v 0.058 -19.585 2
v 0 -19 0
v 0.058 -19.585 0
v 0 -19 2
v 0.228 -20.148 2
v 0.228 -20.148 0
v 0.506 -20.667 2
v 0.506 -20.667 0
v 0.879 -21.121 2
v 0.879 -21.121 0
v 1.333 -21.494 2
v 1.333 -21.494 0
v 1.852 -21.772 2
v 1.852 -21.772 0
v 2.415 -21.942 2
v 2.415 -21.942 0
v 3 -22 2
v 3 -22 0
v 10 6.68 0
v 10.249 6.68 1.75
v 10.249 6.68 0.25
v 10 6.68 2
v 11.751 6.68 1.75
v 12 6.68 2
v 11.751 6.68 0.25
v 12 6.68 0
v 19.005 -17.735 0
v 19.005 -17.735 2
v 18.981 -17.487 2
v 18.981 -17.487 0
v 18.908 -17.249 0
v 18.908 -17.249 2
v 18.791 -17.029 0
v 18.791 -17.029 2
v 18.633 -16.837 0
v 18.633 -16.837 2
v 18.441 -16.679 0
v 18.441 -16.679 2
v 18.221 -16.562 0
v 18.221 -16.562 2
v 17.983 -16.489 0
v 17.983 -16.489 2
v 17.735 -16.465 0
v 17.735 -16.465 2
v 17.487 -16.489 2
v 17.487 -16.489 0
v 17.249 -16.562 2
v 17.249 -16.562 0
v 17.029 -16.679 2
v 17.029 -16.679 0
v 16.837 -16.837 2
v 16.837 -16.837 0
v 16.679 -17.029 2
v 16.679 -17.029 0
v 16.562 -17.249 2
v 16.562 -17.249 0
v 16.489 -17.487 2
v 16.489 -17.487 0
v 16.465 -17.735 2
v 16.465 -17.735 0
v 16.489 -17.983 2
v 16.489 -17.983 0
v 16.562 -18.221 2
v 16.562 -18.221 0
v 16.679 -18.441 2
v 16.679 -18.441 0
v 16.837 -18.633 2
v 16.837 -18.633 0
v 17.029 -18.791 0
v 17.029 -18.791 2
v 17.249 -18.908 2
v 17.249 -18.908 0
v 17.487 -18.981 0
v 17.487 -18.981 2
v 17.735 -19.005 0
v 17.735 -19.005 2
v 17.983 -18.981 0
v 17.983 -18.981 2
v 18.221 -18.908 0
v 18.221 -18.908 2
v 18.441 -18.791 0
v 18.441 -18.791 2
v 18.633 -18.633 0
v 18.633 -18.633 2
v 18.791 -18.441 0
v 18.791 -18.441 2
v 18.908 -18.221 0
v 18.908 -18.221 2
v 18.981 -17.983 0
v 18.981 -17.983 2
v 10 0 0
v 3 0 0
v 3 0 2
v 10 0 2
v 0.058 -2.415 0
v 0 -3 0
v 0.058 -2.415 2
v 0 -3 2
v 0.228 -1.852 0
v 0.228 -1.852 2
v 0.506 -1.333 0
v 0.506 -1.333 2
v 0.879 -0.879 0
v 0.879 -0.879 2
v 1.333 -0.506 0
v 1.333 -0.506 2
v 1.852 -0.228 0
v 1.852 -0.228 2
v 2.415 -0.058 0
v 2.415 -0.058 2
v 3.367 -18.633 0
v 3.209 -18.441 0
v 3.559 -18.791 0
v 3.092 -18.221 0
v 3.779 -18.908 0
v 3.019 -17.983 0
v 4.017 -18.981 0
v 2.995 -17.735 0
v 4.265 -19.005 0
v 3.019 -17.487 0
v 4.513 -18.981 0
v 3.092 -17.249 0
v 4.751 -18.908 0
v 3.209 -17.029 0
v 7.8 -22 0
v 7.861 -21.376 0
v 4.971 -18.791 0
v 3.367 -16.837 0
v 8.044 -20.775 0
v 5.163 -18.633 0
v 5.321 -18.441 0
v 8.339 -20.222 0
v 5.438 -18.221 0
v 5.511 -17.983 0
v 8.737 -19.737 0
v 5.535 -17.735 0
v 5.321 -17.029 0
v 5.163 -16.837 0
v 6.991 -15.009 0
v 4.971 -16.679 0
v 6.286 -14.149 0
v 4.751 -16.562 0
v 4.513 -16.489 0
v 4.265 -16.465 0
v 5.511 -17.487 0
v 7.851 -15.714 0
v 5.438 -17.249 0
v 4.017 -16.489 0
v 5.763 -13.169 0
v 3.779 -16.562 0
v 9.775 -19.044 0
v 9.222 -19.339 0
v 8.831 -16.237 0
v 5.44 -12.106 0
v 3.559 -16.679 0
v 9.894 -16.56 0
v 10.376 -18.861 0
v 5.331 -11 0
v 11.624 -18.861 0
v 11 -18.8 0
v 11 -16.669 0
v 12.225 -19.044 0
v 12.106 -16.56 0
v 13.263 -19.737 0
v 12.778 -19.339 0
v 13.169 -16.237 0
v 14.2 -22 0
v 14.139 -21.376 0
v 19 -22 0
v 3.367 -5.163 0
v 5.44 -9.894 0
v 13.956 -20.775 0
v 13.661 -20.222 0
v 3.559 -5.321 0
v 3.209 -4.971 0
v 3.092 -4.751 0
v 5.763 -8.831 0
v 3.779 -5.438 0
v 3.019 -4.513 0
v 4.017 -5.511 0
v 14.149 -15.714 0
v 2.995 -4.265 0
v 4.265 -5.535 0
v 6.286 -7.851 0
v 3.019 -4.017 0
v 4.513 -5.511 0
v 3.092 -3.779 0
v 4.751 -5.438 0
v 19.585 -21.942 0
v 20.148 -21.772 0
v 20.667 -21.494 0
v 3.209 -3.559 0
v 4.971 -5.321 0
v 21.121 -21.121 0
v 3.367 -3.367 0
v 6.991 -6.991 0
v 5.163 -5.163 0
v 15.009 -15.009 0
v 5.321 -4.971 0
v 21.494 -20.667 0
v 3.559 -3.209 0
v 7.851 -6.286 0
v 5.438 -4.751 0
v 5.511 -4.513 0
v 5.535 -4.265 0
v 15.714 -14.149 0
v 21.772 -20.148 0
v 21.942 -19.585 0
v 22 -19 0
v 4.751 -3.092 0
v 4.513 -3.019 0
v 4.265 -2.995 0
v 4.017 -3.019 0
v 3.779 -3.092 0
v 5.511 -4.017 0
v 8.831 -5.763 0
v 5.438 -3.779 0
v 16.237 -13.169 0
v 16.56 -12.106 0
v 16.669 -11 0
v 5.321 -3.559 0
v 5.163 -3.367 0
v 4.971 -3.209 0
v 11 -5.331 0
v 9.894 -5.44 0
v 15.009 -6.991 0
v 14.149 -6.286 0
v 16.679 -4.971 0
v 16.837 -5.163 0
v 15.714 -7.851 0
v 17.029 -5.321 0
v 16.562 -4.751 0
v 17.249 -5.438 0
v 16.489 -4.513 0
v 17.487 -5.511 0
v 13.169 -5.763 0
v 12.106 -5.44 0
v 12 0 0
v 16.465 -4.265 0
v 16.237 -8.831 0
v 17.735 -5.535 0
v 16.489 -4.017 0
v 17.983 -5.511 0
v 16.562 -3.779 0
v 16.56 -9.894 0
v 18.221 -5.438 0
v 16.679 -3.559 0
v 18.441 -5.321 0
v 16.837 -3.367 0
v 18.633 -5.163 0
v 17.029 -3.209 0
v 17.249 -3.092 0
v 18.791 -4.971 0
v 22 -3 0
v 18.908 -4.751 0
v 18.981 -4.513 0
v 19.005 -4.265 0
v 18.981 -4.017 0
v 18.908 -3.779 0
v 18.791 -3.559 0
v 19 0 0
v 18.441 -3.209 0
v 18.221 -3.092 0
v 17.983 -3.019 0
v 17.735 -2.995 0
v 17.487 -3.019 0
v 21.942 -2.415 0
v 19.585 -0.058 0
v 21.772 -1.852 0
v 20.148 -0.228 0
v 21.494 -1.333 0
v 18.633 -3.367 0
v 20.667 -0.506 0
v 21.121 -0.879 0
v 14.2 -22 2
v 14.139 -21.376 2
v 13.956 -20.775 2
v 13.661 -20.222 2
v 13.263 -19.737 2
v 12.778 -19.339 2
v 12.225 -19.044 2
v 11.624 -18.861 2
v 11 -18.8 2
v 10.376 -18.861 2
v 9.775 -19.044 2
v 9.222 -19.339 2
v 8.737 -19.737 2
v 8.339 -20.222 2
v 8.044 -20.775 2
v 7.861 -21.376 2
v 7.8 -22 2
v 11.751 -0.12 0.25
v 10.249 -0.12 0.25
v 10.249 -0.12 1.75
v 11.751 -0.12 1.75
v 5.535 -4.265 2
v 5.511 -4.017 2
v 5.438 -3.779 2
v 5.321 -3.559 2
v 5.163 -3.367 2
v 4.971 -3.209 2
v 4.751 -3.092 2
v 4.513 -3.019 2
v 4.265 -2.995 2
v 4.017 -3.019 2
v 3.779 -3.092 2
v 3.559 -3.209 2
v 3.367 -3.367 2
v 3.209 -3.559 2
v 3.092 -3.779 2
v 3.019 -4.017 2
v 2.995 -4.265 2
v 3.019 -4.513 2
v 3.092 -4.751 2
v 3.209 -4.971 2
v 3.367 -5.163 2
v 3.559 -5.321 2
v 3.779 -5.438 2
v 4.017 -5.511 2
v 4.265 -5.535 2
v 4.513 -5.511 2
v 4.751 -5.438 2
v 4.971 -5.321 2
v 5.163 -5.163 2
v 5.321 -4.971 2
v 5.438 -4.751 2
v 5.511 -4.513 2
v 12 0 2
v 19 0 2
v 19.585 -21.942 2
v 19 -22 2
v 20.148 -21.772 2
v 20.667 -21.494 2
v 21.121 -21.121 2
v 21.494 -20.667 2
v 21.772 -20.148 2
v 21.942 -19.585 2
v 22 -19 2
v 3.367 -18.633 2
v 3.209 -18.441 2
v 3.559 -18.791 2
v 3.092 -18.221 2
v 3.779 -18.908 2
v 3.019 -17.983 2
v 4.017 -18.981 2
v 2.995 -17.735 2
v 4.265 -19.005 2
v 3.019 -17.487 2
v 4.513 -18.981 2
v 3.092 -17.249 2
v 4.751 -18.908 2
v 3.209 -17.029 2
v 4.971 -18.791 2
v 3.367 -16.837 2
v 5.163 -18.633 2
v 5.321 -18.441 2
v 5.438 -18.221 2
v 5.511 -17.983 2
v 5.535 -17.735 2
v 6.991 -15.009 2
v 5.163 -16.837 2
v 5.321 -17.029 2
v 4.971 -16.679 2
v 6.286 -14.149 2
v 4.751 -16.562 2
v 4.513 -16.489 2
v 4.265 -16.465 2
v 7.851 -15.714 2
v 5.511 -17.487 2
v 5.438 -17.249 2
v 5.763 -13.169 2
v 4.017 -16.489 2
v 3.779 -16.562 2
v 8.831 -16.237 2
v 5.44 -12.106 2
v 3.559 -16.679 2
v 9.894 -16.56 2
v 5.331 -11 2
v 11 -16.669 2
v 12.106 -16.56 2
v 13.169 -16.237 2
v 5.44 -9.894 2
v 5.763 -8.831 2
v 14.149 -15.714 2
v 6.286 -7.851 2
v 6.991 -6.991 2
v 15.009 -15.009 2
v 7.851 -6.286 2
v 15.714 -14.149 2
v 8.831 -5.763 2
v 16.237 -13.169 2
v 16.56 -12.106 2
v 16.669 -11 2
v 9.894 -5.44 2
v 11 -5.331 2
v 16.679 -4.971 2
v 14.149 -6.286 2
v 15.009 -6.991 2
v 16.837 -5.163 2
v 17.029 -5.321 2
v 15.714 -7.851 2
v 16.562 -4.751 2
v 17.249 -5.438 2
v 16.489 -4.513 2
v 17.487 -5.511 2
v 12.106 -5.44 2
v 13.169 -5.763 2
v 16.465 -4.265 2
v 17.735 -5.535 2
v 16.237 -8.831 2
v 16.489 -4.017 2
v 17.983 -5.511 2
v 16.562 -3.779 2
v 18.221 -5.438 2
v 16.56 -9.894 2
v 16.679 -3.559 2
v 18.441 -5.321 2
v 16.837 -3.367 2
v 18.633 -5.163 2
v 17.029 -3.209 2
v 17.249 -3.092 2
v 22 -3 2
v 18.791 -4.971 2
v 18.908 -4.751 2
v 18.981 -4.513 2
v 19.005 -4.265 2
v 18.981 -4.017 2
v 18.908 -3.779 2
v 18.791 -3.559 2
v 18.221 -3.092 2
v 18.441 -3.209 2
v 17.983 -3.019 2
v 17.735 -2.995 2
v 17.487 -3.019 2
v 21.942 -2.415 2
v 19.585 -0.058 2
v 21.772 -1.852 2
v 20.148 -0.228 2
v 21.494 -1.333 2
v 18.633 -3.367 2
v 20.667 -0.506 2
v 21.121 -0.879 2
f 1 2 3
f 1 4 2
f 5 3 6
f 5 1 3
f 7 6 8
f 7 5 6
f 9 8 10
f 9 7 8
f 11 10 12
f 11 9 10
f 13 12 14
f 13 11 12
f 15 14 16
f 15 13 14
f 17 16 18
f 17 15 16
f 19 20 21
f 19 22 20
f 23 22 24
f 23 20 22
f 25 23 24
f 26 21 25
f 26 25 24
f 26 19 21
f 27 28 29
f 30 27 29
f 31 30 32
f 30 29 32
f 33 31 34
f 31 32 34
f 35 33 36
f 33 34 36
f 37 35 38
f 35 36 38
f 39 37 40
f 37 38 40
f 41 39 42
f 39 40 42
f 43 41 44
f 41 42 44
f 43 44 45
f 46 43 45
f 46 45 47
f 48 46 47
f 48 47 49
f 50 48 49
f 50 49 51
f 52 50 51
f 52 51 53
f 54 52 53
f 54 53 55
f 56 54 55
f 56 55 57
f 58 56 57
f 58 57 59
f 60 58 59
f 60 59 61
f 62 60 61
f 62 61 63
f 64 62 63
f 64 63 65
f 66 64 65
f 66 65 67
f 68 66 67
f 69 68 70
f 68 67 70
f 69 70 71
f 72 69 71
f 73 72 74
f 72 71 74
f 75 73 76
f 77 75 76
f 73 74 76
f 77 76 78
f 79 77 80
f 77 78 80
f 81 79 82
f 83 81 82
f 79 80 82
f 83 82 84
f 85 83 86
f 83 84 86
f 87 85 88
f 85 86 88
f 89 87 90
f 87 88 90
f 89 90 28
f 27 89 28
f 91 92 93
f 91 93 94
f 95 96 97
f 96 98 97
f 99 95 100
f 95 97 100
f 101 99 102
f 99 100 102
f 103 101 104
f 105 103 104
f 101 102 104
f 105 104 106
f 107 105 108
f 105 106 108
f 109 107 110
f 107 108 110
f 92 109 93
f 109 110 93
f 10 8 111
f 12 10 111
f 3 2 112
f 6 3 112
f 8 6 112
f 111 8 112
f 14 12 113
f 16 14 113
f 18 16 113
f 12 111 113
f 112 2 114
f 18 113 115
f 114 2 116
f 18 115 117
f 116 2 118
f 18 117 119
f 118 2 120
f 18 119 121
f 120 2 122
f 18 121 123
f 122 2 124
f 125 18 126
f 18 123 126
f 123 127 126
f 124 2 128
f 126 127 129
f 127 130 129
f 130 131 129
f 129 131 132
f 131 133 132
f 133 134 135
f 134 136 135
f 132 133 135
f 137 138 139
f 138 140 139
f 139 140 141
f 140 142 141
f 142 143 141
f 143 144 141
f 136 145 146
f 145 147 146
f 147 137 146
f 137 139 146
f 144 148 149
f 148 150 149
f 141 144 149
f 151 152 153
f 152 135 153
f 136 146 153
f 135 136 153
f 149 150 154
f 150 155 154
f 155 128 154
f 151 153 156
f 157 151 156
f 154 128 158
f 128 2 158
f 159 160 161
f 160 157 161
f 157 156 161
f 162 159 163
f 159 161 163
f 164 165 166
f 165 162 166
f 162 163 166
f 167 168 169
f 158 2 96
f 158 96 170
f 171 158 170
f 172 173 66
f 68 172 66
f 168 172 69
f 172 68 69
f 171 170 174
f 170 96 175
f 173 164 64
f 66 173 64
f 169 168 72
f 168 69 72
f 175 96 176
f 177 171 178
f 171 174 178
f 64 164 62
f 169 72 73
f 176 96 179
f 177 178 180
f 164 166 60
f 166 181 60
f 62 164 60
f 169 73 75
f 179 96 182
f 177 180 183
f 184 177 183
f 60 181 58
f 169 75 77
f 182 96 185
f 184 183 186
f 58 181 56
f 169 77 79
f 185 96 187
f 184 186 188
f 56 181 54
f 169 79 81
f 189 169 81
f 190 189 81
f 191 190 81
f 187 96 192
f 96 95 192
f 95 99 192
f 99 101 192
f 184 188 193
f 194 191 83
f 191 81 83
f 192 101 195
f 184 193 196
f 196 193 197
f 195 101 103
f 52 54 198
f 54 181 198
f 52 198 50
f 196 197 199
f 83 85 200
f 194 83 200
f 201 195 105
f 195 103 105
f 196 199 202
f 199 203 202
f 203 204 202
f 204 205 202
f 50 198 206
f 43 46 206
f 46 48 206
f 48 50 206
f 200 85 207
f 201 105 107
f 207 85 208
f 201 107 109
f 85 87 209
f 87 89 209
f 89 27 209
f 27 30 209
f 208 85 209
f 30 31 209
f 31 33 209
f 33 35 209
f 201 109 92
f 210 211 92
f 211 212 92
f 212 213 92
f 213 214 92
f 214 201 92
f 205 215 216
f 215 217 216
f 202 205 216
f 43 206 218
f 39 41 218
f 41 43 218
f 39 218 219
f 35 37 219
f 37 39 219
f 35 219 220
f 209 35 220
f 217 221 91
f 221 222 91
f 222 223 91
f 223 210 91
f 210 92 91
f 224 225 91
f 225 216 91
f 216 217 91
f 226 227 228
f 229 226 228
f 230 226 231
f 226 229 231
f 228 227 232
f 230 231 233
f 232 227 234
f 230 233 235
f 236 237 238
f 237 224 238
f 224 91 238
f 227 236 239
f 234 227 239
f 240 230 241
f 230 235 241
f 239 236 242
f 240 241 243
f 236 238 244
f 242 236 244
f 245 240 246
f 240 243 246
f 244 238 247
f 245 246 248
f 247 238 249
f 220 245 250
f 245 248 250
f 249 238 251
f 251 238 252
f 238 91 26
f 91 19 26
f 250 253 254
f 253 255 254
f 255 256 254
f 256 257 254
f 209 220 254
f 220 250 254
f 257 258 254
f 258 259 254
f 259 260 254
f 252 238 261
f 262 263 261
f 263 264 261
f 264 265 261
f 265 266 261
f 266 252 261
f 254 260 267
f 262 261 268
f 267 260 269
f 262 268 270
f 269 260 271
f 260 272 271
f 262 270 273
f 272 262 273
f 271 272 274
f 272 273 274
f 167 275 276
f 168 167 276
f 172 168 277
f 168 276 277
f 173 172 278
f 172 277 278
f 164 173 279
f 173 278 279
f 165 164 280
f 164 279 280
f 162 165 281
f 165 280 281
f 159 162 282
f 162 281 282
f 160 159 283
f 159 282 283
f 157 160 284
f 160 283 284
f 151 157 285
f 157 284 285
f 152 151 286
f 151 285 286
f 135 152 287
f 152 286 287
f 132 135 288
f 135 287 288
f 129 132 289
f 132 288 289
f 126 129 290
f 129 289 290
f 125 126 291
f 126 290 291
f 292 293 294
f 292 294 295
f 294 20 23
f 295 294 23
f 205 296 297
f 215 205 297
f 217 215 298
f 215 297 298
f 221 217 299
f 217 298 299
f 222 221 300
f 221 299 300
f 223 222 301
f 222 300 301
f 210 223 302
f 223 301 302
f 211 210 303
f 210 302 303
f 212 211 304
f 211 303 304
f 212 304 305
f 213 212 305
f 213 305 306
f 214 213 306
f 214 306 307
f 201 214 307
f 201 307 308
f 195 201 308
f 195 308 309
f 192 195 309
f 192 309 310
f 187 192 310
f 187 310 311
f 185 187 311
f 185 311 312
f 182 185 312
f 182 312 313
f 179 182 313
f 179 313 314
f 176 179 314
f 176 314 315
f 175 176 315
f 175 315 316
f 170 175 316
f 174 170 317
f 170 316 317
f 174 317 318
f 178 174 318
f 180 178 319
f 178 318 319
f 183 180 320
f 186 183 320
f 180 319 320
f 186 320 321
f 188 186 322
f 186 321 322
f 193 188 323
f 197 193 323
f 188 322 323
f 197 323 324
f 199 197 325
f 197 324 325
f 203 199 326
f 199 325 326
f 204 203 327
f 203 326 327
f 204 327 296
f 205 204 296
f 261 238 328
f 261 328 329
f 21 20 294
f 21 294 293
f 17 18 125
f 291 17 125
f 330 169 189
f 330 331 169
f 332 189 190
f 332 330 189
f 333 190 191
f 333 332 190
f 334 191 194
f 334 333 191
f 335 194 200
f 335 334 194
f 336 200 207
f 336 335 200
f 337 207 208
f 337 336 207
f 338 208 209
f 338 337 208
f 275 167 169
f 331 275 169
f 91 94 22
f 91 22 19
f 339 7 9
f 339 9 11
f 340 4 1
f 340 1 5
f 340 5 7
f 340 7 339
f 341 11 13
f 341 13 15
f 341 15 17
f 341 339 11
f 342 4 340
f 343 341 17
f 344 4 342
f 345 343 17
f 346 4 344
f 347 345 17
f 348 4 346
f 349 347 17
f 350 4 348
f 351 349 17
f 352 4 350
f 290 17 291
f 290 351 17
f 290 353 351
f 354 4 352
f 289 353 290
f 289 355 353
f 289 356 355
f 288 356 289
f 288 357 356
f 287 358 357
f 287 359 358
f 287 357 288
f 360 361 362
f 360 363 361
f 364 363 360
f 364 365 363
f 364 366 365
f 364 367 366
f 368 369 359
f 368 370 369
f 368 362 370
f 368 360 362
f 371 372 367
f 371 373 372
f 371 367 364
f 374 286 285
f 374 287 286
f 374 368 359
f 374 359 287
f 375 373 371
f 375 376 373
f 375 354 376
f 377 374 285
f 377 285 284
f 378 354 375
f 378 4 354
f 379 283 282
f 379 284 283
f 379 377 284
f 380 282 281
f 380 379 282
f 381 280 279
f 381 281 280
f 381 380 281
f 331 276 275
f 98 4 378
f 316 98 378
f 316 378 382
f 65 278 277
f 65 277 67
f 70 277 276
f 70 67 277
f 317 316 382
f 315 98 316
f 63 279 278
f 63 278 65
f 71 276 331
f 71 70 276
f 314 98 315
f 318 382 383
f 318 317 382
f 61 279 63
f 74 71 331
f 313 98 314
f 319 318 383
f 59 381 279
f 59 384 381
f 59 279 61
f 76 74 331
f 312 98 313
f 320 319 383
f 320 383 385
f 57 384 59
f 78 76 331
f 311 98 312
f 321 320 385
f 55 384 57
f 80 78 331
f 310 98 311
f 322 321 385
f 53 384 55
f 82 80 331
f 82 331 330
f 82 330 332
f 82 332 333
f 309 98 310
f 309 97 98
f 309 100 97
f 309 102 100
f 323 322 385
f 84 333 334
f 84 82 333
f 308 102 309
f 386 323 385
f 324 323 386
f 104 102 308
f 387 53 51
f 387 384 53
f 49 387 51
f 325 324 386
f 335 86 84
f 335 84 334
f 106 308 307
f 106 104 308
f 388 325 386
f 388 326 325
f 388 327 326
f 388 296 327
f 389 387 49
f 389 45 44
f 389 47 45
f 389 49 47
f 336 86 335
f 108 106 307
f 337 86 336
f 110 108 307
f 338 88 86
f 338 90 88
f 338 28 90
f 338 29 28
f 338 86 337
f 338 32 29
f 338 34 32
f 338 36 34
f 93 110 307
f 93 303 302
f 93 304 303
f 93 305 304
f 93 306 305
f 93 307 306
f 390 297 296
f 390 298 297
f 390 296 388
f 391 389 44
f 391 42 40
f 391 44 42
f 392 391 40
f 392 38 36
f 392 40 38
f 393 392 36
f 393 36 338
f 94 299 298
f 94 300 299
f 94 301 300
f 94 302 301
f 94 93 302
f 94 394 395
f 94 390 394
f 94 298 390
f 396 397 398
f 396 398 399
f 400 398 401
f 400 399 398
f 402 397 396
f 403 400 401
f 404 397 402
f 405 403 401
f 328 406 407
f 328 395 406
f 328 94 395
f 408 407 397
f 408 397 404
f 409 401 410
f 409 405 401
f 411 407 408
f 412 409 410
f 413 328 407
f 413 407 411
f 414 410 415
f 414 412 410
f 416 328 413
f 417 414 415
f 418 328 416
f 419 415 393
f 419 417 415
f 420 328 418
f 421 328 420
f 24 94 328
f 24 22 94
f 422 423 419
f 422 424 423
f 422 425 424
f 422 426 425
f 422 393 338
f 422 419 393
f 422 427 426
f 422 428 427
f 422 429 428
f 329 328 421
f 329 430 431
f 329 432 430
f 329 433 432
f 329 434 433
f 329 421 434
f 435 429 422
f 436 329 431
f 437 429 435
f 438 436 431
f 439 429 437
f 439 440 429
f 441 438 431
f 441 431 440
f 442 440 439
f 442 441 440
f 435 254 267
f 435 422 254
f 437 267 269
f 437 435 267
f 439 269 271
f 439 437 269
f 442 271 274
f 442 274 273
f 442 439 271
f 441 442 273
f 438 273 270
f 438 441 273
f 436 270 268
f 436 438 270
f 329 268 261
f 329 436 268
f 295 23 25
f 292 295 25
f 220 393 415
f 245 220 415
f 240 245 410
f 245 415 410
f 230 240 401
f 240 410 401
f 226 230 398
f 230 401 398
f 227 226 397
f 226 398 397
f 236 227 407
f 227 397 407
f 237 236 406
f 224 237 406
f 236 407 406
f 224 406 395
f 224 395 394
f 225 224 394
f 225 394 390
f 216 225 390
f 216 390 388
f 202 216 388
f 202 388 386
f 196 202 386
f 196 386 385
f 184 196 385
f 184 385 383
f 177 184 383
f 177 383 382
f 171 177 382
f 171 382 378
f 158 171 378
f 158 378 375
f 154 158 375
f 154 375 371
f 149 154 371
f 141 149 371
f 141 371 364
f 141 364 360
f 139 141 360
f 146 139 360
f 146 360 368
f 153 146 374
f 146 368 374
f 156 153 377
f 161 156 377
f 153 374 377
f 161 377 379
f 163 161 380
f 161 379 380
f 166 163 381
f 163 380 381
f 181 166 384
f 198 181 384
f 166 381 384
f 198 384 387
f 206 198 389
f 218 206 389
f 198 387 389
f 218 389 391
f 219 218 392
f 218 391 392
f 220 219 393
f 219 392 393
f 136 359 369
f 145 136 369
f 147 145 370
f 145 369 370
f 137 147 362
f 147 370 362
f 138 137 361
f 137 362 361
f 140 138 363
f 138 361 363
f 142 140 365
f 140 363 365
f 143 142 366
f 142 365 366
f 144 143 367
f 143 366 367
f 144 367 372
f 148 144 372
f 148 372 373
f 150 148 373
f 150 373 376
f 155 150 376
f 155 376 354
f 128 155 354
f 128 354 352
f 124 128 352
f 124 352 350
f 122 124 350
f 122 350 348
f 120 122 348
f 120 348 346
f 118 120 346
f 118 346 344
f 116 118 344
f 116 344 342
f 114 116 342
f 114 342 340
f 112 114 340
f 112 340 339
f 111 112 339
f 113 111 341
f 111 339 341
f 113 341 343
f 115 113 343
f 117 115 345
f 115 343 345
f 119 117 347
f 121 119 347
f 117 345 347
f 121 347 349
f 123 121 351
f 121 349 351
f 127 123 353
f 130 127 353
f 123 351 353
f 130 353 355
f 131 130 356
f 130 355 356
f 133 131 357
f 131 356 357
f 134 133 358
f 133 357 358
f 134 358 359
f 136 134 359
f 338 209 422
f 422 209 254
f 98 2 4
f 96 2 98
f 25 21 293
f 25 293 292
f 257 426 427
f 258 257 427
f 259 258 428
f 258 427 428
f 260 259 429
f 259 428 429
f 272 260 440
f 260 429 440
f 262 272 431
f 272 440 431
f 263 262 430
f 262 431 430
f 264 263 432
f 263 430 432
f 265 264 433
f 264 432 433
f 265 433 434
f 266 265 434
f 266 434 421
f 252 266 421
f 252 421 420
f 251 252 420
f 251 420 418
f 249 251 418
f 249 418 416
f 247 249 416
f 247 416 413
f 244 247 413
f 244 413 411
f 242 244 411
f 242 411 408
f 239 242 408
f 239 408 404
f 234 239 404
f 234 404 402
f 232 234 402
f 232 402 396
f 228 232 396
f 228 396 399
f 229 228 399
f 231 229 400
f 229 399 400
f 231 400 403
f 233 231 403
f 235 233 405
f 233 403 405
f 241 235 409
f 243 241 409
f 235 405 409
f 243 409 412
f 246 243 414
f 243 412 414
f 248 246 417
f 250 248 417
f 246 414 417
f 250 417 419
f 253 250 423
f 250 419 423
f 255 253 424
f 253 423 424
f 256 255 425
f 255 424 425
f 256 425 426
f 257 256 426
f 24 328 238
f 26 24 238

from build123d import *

# Parameters (mm, degrees)
SKETCH1_W           = 22
SKETCH1_H           = 22
BOSS_EXTRUDE1_DEPTH = 2
FILLET1_R           = 3
SKETCH2_R           = 1.27
CUT_EXTRUDE1_DEPTH  = 32.176914536
CUT_EXTRUDE2_DEPTH  = 32.176914536
SKETCH4_R           = 5.66890013
CUT_EXTRUDE3_DEPTH  = 10
SKETCH5_W           = 2
SKETCH5_H           = 2
BOSS_EXTRUDE2_DEPTH = 6.68
SKETCH6_W           = 1.502554682
SKETCH6_H           = 1.5
CUT_EXTRUDE4_DEPTH  = 6.8


with BuildPart() as part:
    # Sketch1 → Boss-Extrude1 (new body)
    with BuildSketch(Plane.XY):
        with Locations((11, -11)):
            Rectangle(SKETCH1_W, SKETCH1_H)
    extrude(amount=BOSS_EXTRUDE1_DEPTH)

    # Fillet1
    fillet1_edges = [part.edges().sort_by_distance(p)[0] for p in [
        (0, 0, 1),
        (22, 0, 1),
        (22, -22, 1),
        (0, -22, 1),
    ]]
    fillet(fillet1_edges, radius=FILLET1_R)

    # Sketch2 → Cut-Extrude1 (cut, through all)
    with BuildSketch(Plane.XY.offset(2)):
        with Locations((4.265, -4.265)):
            Circle(SKETCH2_R)
        with Locations((4.265, -17.735)):
            Circle(SKETCH2_R)
        with Locations((17.735, -4.265)):
            Circle(SKETCH2_R)
        with Locations((17.735, -17.735)):
            Circle(SKETCH2_R)
    extrude(amount=-CUT_EXTRUDE1_DEPTH, mode=Mode.SUBTRACT)

    # Sketch3 → Cut-Extrude2 (cut, through all)
    with BuildSketch(Plane.XY.offset(2)):
        with BuildLine():
            Line((7.8, -22), (14.2, -22))
            ThreePointArc((14.2, -22), (11, -18.8), (7.8, -22))
        make_face()
    extrude(amount=-CUT_EXTRUDE2_DEPTH, mode=Mode.SUBTRACT)

    # Sketch4 → Cut-Extrude3 (cut)
    with BuildSketch(Plane.XY.offset(2)):
        with Locations((11, -11)):
            Circle(SKETCH4_R)
    extrude(amount=-CUT_EXTRUDE3_DEPTH, mode=Mode.SUBTRACT)

    # Sketch5 → Boss-Extrude2 (add)
    with BuildSketch(Plane(origin=(0, 0, 0), x_dir=(1, 0, 0), z_dir=(0, 1, 0))):
        with Locations((11, -1)):
            Rectangle(SKETCH5_W, SKETCH5_H)
    extrude(amount=BOSS_EXTRUDE2_DEPTH)

    # Sketch6 → Cut-Extrude4 (cut)
    with BuildSketch(Plane(origin=(0, 6.68, 0), x_dir=(1, 0, 0), z_dir=(0, 1, 0))):
        with Locations((11, -1)):
            Rectangle(SKETCH6_W, SKETCH6_H)
    extrude(amount=-CUT_EXTRUDE4_DEPTH, mode=Mode.SUBTRACT)


solid = part.part
